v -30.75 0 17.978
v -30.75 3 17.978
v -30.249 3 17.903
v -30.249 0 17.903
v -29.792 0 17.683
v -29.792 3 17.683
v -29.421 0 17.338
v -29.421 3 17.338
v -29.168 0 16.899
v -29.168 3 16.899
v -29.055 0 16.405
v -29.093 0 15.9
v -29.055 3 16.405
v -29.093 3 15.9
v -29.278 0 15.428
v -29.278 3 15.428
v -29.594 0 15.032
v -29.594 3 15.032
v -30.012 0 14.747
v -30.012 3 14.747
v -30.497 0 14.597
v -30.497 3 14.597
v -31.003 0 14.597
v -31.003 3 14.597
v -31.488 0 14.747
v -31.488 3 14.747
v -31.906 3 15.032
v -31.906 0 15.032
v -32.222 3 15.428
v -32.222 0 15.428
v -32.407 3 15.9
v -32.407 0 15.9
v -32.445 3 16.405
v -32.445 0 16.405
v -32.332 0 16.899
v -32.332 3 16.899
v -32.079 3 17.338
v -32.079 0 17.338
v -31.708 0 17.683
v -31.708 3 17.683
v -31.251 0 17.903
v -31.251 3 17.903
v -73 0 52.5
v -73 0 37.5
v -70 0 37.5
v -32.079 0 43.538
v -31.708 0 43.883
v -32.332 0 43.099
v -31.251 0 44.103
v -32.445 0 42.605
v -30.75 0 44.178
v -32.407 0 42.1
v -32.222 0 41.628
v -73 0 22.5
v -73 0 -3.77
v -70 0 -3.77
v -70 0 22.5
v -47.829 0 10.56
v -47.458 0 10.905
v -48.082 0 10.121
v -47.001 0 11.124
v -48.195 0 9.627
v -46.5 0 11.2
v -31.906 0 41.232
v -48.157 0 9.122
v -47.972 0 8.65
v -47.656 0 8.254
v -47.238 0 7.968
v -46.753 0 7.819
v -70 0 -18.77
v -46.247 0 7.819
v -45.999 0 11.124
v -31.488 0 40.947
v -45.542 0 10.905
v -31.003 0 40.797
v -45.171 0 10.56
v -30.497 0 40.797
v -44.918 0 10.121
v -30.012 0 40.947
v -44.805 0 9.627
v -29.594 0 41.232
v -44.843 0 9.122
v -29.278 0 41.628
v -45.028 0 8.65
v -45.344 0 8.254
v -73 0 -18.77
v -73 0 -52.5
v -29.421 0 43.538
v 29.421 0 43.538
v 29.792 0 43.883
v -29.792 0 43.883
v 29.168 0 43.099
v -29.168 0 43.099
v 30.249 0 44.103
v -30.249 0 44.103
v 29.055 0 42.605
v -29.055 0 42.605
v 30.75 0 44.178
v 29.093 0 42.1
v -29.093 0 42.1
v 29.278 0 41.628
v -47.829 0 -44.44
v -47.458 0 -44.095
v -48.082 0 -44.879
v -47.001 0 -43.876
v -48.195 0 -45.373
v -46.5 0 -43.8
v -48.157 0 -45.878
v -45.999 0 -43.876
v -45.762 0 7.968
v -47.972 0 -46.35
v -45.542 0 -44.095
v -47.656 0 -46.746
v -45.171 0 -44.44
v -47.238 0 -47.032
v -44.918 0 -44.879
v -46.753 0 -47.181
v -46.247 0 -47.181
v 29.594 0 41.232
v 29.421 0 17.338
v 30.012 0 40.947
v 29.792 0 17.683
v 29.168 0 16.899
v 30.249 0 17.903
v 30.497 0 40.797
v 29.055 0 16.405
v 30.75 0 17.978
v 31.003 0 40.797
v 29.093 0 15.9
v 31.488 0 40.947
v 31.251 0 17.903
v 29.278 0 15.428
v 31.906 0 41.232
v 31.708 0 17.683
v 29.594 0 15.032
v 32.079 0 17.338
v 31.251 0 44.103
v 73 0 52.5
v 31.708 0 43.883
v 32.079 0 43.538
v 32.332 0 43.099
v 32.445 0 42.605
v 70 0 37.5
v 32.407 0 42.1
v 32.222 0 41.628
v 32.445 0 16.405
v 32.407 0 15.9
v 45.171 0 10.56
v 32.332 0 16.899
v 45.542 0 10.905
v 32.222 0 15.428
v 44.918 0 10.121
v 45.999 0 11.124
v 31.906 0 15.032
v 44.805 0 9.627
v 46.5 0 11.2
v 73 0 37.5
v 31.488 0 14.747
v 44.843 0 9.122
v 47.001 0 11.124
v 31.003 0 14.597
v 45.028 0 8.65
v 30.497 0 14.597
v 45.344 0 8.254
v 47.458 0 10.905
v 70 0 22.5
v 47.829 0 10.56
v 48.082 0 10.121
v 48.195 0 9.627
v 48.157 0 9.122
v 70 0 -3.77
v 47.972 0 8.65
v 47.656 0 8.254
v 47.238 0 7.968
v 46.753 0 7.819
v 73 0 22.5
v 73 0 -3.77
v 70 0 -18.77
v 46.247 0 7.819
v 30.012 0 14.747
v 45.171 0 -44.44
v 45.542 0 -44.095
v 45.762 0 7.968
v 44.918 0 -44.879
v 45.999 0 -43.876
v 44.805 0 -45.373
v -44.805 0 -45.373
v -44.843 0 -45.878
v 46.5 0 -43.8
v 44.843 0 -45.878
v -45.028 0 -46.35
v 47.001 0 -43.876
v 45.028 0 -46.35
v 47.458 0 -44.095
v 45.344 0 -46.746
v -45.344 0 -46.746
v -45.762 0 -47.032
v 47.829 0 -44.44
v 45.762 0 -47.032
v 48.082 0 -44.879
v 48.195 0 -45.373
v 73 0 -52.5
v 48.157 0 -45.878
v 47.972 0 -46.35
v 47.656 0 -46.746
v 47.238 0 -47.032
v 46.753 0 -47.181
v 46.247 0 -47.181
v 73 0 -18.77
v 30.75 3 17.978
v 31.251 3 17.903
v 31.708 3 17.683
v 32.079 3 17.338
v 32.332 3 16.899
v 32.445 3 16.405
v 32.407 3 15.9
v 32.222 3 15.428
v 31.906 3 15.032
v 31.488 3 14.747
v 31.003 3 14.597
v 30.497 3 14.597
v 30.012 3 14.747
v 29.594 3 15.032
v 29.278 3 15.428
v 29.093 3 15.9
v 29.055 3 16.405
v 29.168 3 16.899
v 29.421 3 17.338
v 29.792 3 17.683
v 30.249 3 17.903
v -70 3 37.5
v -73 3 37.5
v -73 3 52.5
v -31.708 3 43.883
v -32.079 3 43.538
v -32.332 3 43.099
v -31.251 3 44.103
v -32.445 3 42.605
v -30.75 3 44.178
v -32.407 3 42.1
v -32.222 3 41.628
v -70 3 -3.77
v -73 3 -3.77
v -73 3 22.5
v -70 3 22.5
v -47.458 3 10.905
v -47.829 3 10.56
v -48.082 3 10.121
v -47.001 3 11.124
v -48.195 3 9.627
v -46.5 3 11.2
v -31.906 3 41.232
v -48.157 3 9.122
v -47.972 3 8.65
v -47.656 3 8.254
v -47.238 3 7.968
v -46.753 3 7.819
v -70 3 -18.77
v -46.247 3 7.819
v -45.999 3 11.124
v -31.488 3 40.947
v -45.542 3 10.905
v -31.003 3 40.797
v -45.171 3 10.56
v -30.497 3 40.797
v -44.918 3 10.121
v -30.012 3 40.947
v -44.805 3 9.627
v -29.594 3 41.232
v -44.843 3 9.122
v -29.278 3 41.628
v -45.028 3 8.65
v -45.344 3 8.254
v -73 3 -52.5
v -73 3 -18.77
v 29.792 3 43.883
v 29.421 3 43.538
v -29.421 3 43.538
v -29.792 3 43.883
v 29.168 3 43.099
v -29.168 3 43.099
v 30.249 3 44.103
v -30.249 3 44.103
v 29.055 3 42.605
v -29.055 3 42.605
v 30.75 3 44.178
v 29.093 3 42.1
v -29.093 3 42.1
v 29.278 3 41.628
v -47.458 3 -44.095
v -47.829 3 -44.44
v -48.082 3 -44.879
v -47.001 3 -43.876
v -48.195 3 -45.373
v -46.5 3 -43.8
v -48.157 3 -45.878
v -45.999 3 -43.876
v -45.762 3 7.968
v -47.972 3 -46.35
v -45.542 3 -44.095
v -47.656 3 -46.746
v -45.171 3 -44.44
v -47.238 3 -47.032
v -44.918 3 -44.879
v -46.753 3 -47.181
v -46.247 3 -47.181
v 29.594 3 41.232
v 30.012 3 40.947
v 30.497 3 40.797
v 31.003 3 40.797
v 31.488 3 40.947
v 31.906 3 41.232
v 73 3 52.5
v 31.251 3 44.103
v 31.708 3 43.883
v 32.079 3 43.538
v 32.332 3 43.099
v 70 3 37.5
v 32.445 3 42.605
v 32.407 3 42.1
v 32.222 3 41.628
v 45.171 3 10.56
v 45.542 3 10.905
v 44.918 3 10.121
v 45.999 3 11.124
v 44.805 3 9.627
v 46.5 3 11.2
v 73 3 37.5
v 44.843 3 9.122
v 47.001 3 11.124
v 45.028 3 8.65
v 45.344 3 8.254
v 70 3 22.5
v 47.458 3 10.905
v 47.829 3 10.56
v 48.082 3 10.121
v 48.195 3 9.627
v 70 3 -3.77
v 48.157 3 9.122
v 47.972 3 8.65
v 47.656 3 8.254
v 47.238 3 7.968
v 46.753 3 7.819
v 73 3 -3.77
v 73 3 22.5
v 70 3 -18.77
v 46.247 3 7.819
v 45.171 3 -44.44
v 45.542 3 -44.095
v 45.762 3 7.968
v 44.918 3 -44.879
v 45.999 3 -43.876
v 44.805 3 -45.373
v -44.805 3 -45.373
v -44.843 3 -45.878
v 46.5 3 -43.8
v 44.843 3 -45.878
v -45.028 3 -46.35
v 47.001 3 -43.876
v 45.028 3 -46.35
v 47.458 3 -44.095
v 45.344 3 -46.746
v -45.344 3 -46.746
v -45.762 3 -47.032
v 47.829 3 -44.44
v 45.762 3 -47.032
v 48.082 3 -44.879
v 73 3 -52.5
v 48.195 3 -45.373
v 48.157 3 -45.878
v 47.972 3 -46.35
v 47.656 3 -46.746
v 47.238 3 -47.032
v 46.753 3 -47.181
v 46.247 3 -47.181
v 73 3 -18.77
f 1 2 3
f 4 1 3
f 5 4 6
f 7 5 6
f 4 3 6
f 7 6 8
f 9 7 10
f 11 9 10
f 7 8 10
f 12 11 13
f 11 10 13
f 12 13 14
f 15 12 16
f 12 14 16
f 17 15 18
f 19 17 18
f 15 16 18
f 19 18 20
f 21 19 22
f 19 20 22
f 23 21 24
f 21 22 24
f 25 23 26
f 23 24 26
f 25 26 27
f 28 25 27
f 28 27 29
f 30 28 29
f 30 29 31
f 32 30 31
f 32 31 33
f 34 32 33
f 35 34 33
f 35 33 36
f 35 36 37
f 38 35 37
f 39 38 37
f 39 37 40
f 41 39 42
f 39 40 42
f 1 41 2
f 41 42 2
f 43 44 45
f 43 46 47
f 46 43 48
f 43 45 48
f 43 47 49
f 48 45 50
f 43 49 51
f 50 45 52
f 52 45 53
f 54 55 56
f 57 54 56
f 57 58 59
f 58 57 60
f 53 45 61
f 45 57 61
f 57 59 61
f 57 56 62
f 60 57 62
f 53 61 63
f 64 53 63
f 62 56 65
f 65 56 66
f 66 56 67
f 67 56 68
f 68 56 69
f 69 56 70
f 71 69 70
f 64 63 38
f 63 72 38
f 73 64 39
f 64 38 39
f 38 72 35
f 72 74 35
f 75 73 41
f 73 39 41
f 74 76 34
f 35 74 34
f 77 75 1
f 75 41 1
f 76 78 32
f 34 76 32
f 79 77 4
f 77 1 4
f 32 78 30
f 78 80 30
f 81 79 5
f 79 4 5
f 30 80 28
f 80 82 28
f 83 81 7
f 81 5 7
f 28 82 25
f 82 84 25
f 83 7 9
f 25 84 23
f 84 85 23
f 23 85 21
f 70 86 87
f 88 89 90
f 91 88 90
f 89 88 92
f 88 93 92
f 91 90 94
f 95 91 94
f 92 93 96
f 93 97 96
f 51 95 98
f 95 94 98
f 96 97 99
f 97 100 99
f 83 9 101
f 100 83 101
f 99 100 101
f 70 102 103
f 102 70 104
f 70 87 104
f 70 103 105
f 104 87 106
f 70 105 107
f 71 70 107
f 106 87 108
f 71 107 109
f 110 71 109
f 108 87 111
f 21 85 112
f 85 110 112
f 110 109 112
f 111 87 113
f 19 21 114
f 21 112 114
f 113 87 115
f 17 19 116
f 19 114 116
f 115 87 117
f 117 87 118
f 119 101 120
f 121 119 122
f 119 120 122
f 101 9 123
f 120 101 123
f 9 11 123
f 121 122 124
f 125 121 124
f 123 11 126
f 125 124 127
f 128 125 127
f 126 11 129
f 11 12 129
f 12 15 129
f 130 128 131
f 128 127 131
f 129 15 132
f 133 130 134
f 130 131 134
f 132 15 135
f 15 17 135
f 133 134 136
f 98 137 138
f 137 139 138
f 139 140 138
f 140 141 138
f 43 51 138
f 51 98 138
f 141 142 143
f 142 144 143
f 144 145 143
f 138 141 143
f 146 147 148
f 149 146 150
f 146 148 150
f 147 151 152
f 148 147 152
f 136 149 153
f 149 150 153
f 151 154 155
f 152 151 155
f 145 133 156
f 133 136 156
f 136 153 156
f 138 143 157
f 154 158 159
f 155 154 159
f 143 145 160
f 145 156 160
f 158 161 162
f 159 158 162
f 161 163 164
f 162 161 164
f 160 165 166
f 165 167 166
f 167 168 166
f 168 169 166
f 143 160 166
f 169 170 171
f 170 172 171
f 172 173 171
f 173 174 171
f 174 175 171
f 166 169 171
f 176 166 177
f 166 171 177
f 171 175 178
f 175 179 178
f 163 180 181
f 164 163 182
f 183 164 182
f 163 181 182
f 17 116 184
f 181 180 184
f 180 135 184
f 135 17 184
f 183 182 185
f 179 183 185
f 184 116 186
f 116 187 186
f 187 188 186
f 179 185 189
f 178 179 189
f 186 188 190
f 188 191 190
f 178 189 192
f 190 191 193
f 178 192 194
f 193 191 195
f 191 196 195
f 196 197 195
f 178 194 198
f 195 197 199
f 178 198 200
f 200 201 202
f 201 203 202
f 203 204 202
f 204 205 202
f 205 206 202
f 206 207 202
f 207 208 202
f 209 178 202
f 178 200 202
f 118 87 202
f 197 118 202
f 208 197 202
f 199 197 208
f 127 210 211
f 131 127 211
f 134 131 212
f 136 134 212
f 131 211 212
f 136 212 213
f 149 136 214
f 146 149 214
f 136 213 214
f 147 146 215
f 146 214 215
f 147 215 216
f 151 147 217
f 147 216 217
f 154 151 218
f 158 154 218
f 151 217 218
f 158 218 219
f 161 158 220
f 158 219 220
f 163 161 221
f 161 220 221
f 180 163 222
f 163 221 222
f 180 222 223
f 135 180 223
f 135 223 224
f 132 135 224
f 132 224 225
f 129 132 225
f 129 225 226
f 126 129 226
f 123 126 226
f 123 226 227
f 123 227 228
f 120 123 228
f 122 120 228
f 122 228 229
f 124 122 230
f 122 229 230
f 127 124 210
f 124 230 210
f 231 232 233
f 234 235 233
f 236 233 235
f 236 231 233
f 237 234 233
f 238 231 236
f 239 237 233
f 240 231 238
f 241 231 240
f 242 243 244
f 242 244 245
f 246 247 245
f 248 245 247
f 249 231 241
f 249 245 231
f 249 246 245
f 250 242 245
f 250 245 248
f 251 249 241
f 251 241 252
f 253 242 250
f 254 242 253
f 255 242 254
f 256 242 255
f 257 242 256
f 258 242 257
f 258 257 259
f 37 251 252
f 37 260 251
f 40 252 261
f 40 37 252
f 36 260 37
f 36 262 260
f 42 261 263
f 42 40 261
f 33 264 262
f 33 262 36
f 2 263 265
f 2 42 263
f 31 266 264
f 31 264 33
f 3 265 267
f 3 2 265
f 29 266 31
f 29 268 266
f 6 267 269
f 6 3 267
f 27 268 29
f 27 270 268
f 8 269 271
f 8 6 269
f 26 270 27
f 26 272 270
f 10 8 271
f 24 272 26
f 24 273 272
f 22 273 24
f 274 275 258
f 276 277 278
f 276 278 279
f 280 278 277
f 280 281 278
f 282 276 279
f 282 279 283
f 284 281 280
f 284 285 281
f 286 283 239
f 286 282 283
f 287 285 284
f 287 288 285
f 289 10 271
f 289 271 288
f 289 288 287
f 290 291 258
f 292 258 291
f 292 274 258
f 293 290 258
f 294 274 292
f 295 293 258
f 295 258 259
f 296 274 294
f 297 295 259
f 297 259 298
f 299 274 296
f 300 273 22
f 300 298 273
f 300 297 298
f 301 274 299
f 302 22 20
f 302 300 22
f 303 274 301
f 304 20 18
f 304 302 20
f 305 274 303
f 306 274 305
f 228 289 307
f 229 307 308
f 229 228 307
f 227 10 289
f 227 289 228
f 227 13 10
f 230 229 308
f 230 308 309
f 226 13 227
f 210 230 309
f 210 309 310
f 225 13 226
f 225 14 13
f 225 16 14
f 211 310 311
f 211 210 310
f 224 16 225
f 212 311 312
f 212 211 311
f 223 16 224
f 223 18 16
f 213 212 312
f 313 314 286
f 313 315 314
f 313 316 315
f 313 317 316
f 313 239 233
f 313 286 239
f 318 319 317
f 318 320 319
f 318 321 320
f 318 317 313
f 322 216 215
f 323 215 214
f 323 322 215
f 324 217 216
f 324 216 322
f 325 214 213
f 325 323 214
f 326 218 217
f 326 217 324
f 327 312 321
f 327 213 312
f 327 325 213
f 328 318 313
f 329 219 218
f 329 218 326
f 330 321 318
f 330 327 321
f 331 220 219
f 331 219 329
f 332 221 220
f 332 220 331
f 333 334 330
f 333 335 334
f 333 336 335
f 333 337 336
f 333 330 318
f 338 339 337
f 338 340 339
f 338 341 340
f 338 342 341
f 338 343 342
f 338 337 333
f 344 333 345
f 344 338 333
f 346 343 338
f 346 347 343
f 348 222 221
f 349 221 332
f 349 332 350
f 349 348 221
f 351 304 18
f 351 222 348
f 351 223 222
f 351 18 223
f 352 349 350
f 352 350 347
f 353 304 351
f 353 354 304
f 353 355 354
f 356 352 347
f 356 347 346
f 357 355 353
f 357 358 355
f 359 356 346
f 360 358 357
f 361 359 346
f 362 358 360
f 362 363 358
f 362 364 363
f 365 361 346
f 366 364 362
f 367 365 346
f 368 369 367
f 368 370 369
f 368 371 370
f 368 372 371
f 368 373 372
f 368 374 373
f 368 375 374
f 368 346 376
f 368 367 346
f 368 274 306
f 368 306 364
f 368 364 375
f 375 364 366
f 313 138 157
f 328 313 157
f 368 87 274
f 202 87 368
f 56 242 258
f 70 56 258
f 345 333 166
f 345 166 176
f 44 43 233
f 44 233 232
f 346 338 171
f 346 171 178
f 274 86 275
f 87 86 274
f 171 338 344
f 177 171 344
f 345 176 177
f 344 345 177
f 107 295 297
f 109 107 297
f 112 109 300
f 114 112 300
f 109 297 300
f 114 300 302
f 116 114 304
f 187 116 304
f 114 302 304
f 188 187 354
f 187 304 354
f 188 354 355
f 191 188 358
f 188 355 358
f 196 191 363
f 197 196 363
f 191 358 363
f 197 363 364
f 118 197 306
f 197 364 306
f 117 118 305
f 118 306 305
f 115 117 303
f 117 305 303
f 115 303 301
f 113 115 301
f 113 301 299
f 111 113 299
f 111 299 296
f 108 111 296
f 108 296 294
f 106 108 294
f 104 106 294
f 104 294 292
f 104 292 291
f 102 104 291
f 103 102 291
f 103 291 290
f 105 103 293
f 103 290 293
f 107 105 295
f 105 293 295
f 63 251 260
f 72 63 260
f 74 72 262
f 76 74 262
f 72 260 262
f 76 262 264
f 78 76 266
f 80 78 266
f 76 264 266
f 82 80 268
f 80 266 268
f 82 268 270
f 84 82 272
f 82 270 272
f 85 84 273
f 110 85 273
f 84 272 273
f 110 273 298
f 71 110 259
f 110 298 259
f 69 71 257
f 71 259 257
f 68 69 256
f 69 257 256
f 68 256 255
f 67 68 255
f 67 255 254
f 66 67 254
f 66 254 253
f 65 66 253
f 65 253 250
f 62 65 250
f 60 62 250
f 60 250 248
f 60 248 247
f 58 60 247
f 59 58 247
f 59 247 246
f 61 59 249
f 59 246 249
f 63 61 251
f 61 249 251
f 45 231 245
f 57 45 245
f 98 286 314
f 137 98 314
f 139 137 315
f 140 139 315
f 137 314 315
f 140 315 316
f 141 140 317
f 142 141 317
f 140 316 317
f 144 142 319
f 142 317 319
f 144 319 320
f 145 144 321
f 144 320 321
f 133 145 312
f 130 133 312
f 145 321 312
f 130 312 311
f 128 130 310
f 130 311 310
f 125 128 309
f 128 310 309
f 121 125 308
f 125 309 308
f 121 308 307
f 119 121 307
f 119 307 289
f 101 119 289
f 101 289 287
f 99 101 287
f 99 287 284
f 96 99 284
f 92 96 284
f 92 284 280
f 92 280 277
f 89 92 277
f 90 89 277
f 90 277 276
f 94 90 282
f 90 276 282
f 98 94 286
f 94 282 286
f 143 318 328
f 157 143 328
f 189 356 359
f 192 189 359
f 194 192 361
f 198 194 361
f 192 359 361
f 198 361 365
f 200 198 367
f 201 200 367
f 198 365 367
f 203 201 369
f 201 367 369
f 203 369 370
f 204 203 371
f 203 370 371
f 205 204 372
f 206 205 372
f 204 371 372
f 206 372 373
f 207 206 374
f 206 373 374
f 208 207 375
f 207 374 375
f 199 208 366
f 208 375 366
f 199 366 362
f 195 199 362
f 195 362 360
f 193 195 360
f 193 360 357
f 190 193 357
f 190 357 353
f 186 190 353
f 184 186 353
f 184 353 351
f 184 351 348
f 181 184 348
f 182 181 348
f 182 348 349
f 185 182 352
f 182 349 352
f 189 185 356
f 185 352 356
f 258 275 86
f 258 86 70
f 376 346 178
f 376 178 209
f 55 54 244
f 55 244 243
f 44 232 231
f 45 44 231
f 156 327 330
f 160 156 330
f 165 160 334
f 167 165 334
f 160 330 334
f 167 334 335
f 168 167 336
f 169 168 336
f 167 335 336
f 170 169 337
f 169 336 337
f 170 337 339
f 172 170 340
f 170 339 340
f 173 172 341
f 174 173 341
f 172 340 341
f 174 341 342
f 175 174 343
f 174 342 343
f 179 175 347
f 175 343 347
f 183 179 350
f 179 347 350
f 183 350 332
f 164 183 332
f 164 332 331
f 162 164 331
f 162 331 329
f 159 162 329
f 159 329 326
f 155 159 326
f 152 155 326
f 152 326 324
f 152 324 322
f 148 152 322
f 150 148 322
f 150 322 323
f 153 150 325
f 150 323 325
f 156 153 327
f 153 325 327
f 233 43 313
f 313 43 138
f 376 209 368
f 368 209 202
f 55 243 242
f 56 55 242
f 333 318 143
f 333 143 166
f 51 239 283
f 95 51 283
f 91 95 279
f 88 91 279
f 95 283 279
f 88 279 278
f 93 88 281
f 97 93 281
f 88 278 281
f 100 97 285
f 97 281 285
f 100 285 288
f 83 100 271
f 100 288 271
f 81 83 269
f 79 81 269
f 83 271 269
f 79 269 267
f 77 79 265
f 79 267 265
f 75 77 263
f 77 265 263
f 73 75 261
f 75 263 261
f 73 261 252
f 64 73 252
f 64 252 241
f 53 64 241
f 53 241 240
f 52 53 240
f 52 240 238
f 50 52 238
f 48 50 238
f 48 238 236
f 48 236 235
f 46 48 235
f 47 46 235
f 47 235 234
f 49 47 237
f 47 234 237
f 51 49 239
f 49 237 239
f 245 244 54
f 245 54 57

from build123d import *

# Parameters (mm, degrees)
SKETCH1_W           = 146
SKETCH1_H           = 105
BOSS_EXTRUDE1_DEPTH = 3
SKETCH2_R           = 1.7
SKETCH2_W           = 3
SKETCH2_H           = 15
CUT_EXTRUDE1_DEPTH  = 3


with BuildPart() as part:
    # Sketch1 → Boss-Extrude1 (new body)
    with BuildSketch(Plane(origin=(0, 0, 0), x_dir=(1, 0, 0), z_dir=(0, 1, 0))):
        Rectangle(SKETCH1_W, SKETCH1_H)
    extrude(amount=BOSS_EXTRUDE1_DEPTH)

    # Sketch2 → Cut-Extrude1 (cut)
    with BuildSketch(Plane(origin=(0, 3, 0), x_dir=(1, 0, 0), z_dir=(0, 1, 0))):
        with Locations(Location((-46.5, 45.5, 0), (0, 0, 270))):
            Circle(SKETCH2_R)
        with Locations(Location((46.5, 45.5, 0), (0, 0, 270))):
            Circle(SKETCH2_R)
        with Locations(Location((46.5, -9.5, 0), (0, 0, 270))):
            Circle(SKETCH2_R)
        with Locations(Location((-46.5, -9.5, 0), (0, 0, 270))):
            Circle(SKETCH2_R)
        with Locations(Location((-30.75, -16.278395091, 0), (0, 0, 270))):
            Circle(SKETCH2_R)
        with Locations(Location((30.75, -16.278395091, 0), (0, 0, 270))):
            Circle(SKETCH2_R)
        with Locations(Location((30.75, -42.478395091, 0), (0, 0, 270))):
            Circle(SKETCH2_R)
        with Locations(Location((-30.75, -42.478395091, 0), (0, 0, 270))):
            Circle(SKETCH2_R)
        with Locations((-71.5, -30)):
            Rectangle(SKETCH2_W, SKETCH2_H)
        with Locations((-71.5, 11.27)):
            Rectangle(SKETCH2_W, SKETCH2_H)
        with Locations((71.5, 11.27)):
            Rectangle(SKETCH2_W, SKETCH2_H)
        with Locations((71.5, -30)):
            Rectangle(SKETCH2_W, SKETCH2_H)
    extrude(amount=-CUT_EXTRUDE1_DEPTH, mode=Mode.SUBTRACT)


solid = part.part
